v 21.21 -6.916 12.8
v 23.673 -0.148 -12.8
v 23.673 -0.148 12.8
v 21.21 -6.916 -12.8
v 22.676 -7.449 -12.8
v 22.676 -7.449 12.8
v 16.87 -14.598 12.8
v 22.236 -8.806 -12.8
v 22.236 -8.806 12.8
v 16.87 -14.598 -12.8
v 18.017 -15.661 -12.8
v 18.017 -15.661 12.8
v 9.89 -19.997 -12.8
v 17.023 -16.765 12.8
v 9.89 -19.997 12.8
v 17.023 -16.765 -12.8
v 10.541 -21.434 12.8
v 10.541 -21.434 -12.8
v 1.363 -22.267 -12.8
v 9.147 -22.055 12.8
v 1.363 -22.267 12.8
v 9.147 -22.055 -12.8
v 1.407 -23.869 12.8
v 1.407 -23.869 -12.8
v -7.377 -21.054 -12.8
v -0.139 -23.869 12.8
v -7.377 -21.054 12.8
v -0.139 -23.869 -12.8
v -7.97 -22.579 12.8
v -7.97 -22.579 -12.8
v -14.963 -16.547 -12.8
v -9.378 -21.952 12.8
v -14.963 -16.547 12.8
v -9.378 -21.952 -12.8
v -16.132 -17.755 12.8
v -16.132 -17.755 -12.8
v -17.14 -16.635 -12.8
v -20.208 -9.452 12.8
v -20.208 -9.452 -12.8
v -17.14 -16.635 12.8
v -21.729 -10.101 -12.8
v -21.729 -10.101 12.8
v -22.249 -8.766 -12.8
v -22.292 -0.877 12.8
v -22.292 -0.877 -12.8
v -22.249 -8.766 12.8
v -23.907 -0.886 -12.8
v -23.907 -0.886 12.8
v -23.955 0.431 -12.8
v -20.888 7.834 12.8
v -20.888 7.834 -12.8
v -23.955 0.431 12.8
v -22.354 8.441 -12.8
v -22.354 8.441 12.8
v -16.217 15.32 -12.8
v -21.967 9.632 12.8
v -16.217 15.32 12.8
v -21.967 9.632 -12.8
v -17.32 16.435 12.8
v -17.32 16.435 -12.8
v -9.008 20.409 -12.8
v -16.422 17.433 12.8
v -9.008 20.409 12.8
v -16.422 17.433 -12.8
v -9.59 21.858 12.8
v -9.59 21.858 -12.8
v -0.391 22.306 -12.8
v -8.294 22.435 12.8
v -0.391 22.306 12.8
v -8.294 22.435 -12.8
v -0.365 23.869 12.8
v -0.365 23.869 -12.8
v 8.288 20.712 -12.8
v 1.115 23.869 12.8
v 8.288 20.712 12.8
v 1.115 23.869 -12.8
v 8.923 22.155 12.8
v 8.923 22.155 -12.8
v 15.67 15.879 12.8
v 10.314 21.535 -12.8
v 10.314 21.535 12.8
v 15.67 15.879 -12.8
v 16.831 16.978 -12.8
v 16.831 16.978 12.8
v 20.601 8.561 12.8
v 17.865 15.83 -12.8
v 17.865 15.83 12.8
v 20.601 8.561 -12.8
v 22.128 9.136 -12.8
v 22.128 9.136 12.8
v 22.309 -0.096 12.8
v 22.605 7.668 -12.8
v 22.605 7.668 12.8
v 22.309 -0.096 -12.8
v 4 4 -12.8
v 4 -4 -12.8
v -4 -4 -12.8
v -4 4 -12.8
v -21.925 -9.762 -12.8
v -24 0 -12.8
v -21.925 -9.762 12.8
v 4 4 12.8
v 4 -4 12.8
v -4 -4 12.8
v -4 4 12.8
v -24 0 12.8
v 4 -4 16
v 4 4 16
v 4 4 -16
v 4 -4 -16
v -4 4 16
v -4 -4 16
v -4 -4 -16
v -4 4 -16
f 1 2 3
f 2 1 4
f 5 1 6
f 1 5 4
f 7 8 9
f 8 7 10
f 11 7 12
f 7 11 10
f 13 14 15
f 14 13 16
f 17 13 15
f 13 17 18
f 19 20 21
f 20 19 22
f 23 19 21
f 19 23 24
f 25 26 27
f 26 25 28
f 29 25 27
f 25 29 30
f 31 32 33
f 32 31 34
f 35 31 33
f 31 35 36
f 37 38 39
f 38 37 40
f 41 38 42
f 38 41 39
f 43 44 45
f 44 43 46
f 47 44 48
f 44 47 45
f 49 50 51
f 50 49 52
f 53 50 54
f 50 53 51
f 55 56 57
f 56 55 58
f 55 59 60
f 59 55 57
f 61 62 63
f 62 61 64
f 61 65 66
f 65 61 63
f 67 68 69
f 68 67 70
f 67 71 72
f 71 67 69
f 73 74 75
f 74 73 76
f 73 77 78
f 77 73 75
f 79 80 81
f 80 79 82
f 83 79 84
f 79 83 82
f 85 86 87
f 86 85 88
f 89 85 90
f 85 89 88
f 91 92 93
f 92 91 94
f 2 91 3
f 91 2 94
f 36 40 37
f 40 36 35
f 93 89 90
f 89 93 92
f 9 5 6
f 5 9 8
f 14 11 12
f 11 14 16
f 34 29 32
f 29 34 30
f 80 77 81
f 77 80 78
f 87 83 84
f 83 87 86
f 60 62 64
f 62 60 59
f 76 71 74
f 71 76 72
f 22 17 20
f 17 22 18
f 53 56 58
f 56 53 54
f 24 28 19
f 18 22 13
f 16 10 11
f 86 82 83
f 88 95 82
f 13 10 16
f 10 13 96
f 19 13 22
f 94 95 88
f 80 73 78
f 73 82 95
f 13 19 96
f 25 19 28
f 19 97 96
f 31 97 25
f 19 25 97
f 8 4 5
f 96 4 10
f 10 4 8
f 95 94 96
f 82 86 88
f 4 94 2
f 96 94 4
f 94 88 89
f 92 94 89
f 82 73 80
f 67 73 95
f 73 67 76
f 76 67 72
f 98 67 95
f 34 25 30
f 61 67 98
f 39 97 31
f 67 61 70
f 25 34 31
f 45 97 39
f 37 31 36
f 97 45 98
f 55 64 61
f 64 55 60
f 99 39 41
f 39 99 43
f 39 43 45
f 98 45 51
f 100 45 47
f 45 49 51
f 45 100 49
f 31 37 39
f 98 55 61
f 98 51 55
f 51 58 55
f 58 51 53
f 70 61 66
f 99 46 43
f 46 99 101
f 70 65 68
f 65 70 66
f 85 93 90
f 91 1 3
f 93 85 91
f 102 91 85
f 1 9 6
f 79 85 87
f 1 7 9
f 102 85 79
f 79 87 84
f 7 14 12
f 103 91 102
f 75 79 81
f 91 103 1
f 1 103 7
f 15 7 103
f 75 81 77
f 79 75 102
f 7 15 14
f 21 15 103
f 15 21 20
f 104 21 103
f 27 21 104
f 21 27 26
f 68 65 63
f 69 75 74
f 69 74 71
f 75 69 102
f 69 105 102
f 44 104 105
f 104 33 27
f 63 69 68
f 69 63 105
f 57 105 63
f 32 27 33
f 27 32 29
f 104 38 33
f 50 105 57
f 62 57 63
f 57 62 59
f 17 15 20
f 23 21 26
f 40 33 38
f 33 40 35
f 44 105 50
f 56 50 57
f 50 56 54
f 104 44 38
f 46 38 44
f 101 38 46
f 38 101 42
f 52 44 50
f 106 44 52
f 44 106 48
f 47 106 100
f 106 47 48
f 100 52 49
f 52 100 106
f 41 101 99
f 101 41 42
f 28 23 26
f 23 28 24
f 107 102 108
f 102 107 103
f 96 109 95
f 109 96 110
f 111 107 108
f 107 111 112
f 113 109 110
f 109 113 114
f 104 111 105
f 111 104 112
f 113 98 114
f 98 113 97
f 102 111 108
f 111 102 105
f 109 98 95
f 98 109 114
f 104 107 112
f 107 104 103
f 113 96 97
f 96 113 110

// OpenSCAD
size = 32;//block=32 //item=8


cube([size * 0.25, size * 0.25, size * 1], center = true);//shaft

difference() {
  cylinder(h = size * 0.8, d = size * 1.5, center = true);

  union() {
    count = 16;
    for(i = [0:1:count - 1]) {
      rotate([365 / count * i, 90, 0]) {
        translate([0, 0, size * 0.8]) {
          rotate([20, 0, 0]) {
            cube([size * 1, size * 0.5, size * 0.11], center = true);
          }
          ;//rotate
        }
        ;//translate
      }
      ;//rotate
    }
    ;//for
  }
  ;//union

}
;//difference
